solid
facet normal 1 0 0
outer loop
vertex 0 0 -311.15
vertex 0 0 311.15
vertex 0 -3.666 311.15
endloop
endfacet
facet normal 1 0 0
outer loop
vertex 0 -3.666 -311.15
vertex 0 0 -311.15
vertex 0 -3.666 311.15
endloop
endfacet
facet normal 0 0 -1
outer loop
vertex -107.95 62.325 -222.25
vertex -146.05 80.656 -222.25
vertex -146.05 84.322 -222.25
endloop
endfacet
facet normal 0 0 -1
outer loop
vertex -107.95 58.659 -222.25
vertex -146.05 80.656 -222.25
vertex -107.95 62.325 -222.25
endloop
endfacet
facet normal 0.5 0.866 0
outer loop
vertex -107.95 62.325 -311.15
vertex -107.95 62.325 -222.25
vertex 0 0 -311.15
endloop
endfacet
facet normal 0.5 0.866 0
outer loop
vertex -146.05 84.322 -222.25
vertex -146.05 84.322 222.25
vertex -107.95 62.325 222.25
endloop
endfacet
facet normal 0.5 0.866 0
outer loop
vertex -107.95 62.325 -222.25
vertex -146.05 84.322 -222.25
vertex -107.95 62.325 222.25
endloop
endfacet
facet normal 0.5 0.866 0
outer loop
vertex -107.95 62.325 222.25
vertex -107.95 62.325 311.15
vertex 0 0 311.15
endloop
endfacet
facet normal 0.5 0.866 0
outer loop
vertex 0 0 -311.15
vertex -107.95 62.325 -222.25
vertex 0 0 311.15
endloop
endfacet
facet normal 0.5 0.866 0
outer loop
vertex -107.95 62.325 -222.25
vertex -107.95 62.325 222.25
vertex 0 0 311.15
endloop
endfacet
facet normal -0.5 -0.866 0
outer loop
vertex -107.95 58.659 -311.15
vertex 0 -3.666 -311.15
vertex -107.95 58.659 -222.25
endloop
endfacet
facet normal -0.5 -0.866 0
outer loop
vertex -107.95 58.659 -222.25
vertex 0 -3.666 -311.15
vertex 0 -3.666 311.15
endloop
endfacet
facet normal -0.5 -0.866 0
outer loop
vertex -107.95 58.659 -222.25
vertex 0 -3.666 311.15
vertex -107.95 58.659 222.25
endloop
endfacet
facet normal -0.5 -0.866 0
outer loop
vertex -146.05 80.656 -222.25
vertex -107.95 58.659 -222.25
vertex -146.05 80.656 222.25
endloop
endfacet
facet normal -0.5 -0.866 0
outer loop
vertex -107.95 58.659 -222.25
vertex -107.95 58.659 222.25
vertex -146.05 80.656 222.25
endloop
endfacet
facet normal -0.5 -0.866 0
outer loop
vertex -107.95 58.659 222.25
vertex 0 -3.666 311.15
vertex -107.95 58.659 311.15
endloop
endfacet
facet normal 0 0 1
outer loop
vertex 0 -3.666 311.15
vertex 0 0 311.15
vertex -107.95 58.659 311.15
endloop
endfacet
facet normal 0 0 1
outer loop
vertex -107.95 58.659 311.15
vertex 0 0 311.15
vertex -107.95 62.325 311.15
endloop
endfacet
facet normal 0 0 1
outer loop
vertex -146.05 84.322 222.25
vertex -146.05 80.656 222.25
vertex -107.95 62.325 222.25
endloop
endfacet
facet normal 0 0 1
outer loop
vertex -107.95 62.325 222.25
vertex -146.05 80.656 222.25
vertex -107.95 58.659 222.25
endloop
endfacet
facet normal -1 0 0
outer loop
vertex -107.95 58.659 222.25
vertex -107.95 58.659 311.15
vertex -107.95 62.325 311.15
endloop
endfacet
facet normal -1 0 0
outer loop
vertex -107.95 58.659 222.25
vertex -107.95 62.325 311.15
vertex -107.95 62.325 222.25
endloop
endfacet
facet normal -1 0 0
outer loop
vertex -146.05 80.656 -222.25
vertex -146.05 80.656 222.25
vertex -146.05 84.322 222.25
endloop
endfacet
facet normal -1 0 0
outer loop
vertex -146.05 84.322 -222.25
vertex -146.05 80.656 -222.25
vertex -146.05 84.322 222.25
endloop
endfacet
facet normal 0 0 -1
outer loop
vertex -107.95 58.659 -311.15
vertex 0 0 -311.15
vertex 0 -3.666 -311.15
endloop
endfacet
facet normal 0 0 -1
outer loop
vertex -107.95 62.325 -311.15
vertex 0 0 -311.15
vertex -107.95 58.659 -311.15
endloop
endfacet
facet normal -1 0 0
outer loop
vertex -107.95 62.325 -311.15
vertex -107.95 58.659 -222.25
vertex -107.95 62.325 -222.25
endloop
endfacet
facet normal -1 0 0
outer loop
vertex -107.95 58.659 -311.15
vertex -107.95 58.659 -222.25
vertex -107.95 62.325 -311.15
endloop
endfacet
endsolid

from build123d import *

# Parameters (mm, degrees)
BOSS_EXTRUDE1_DEPTH = 311.15
SKETCH2_W           = 38.1
SKETCH2_H           = 88.9
CUT_EXTRUDE1_DEPTH  = 354.914009094


with BuildPart() as part:
    # Sketch1 → Boss-Extrude1 (new, symmetric)
    with BuildSketch(Plane.XY):
        Polygon((0, 0), (0, -3.666174209), (-146.05, 80.655832606), (-146.05, 84.322006815), align=None)
    extrude(amount=BOSS_EXTRUDE1_DEPTH, both=True)

    # Sketch2 → Cut-Extrude1 (cut, through all)
    with BuildSketch(Plane(origin=(0, 0, 0), x_dir=(1, 0, 0), z_dir=(0, 1, 0))):
        with Locations((-127, -266.7)):
            Rectangle(SKETCH2_W, SKETCH2_H)
        with Locations((-127, 266.7)):
            Rectangle(SKETCH2_W, SKETCH2_H)
    extrude(amount=CUT_EXTRUDE1_DEPTH, mode=Mode.SUBTRACT)


solid = part.part
